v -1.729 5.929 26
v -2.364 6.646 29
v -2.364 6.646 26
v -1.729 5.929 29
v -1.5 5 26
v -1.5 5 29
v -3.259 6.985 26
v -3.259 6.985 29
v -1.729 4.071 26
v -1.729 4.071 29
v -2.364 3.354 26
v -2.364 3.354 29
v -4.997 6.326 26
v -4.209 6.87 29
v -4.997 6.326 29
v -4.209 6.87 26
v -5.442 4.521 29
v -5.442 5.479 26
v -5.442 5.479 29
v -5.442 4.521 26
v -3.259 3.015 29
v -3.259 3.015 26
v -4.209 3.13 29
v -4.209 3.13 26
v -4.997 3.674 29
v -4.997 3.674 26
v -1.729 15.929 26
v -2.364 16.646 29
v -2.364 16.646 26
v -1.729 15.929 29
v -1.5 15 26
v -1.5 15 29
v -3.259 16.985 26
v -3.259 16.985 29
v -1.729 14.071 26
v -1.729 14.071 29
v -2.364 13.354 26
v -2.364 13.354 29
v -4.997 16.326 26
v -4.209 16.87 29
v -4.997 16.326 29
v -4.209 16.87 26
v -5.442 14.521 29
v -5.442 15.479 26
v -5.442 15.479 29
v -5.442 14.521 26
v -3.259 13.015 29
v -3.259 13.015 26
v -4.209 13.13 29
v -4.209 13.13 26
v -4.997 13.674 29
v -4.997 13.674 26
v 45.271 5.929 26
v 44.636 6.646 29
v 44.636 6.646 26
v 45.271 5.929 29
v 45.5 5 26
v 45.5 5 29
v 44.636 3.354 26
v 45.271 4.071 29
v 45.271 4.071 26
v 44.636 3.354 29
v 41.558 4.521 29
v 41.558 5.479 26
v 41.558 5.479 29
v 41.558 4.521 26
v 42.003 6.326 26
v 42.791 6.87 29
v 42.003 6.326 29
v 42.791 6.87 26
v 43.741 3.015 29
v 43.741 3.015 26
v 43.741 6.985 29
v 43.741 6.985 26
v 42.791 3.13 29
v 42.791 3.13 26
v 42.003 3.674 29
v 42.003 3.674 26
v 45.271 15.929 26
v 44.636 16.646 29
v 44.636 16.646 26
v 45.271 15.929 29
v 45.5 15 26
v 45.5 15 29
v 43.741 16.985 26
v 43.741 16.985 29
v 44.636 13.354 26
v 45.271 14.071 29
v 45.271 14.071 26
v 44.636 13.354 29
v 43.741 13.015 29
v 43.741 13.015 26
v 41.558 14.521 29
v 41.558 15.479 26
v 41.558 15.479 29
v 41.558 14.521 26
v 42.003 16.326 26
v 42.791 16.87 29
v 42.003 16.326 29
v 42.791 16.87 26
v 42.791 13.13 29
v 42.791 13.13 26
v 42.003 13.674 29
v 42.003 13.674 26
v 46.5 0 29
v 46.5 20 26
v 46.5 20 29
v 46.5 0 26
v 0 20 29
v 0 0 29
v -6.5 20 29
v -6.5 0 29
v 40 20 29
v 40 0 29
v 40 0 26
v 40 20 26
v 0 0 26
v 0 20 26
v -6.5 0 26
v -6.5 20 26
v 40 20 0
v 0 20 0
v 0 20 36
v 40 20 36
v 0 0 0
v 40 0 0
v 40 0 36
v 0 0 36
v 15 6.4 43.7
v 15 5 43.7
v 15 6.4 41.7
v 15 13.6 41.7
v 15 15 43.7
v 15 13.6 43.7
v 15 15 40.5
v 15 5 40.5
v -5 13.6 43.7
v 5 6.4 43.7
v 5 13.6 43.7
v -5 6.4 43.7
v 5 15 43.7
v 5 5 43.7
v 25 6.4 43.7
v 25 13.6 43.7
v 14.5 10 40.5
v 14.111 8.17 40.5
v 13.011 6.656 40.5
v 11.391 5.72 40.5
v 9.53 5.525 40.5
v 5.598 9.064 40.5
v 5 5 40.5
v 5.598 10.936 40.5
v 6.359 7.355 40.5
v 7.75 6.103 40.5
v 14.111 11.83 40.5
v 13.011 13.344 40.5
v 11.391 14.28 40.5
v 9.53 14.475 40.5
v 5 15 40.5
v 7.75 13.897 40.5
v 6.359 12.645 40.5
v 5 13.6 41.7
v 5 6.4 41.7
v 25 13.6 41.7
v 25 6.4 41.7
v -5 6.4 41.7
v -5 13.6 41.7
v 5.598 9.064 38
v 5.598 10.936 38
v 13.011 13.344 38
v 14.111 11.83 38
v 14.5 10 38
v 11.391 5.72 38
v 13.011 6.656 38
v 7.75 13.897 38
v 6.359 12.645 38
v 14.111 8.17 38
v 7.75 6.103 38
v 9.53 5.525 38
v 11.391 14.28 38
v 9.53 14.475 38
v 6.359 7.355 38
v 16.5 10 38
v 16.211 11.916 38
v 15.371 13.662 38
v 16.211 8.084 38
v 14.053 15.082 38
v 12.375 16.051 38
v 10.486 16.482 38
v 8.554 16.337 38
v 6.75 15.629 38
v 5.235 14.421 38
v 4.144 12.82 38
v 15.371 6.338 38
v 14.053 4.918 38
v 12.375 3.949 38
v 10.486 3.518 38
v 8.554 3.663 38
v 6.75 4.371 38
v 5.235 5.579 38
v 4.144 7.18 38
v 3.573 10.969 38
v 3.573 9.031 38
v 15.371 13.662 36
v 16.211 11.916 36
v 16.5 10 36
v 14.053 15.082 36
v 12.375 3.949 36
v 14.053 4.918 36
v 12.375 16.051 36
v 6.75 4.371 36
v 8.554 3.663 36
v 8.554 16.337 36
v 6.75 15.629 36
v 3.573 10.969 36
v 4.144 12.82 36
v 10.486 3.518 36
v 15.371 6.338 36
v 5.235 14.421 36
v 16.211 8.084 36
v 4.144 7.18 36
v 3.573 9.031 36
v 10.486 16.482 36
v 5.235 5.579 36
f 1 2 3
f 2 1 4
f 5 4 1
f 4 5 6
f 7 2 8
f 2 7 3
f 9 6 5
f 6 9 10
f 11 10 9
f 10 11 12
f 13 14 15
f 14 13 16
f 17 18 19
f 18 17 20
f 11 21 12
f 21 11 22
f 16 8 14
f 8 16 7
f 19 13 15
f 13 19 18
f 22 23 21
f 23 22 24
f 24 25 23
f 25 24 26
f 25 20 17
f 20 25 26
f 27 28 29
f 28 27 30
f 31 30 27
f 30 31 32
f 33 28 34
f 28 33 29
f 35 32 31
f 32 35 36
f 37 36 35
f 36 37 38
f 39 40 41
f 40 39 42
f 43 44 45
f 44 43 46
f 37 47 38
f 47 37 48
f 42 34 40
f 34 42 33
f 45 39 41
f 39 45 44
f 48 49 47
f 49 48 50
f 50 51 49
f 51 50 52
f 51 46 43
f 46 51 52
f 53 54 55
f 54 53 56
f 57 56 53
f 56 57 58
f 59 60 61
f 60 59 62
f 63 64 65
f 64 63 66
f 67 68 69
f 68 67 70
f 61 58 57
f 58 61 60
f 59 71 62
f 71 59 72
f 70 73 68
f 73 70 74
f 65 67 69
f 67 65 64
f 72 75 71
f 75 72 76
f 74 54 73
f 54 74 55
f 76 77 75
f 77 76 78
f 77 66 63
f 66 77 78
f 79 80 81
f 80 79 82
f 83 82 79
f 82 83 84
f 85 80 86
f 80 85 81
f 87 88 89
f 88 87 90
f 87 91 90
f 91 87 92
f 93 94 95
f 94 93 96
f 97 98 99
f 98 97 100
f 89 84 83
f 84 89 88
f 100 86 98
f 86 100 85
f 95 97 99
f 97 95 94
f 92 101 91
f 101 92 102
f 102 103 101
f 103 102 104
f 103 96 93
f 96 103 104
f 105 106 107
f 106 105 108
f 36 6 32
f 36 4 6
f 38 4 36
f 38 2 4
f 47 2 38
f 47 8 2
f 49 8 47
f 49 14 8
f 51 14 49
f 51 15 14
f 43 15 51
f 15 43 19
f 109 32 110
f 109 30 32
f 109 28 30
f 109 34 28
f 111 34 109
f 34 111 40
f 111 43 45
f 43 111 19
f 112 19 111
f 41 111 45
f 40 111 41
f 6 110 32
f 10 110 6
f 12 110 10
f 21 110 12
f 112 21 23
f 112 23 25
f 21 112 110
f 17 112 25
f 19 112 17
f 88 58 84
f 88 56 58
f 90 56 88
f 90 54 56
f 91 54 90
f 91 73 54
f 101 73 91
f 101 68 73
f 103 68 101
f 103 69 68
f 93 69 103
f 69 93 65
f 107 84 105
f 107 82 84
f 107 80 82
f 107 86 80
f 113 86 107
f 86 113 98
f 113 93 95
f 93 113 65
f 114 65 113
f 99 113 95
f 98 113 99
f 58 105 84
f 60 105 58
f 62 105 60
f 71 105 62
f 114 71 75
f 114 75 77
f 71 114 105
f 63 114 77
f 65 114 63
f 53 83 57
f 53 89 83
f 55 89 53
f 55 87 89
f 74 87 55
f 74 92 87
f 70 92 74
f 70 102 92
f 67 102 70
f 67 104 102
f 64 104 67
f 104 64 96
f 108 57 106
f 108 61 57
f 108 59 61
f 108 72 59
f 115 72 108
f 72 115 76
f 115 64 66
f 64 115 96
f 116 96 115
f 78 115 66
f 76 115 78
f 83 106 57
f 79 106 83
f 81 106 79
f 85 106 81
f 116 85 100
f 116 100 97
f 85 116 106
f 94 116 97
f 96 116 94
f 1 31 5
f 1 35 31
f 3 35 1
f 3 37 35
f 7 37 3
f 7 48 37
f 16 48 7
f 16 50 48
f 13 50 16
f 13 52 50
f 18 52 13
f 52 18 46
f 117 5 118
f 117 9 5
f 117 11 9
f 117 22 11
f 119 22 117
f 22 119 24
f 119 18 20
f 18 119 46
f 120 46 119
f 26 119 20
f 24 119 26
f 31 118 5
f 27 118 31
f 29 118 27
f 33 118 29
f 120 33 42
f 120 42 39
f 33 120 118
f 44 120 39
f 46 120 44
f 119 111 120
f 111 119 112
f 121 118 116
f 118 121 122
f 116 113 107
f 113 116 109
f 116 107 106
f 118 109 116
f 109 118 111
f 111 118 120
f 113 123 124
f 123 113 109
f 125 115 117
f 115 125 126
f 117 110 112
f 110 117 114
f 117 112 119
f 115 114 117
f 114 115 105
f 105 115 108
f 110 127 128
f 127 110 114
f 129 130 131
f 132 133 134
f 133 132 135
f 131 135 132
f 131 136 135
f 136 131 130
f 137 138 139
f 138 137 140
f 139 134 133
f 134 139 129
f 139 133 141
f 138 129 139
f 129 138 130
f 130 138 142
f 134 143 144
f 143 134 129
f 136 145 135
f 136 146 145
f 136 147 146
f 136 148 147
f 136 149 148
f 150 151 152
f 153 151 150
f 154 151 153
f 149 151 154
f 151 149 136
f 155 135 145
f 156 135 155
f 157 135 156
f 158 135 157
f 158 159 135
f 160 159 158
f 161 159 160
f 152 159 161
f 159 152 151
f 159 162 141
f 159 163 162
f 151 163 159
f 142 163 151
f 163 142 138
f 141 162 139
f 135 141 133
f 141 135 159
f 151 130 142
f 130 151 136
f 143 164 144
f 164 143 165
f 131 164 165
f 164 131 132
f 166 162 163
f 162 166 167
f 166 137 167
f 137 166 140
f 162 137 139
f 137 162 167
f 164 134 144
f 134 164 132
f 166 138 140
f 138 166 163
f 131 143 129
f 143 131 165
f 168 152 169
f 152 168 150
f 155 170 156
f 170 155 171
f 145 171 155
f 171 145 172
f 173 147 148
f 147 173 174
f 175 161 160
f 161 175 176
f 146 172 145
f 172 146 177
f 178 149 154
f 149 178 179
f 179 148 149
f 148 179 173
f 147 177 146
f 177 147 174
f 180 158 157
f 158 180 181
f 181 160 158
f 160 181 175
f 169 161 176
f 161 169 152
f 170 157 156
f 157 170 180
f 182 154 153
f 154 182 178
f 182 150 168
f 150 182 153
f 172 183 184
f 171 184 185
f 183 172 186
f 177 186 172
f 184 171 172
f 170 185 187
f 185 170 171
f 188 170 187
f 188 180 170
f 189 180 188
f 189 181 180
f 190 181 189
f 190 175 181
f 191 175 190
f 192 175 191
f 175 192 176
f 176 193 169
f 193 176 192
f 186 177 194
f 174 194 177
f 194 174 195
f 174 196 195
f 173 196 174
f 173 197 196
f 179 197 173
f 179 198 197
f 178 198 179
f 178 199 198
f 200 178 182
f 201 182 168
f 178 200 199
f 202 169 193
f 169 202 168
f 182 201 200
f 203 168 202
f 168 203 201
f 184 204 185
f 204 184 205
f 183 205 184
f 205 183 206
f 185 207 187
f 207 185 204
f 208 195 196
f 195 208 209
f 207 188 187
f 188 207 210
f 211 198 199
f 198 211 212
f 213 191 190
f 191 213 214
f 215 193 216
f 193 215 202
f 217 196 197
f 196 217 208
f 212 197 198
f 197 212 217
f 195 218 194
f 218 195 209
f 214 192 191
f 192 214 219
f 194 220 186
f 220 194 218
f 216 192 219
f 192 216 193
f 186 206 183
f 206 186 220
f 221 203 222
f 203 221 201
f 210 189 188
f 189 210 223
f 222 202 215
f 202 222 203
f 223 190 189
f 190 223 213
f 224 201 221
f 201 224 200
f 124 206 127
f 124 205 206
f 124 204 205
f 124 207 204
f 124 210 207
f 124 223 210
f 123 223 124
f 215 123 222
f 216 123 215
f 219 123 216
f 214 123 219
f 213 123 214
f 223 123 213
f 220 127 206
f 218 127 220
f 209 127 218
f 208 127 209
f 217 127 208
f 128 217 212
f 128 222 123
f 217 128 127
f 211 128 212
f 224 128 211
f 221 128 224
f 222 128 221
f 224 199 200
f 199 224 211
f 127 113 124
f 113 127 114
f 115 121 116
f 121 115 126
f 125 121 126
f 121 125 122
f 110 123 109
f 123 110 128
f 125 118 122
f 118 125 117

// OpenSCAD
// file: servoMountLock.scad
module servoMountLock()
{
  space=[0.5, 0.5, 0.5];
  difference()
  {
    translate([-14-5, -10-10, 0])
      cube([2*(14+5), 2*(10+10), 4.5]);
    // screw holes
    for(dx = [-1, +1])
      for(dy = [-1, +1])
        translate([dx*14, dy*10, -2])
          cylinder(r=(3+1)/2, $fs=1.5, h=4.5+4);
    translate([0, 0, 1])
    {
      // main rod mounting hole
      translate([-(7.5+space[0])/2, -(30+space[1])/2, 4.5-(2+space[2])])
        cube([7.5, 30, 2] + space);
      // center, thicker part
      translate([-(10+space[0])/2, -(10+space[1])/2, 4.5-(3.5+space[2])])
        cube([10, 10, 3.5] + space);
    }
    // servo's screw space
    translate([0, 0, -1])
      cylinder(r=(9+1)/2, h=6, $fs=1);
  }
}

for(i=[0:1])
  translate([0, i*45, 0])
    servoMountLock();
// main file
use <servoMountLock.scad>

module servo()
{
  cube([40, 20, 36]);
  // mount shelf
  difference()
  {
    translate([-13/2, 0, 26])
      cube([53, 20, 3]);
    // holes
    #for(dx=[-1, +1])
      for(dy=[-1, +1])
        translate([53/2-13/2+dx*47/2, 20/2+dy*(6-1), 26-4])
          cylinder(r=4/2, $fs=1, h=10);
  }
  // rotor bottom
  translate([13/2+3.5, 20/2, 36])
  {
    cylinder(r=13/2, h=2);
    // rotor itself
    translate([0,0,2])
    {
      cylinder(r=9/2, h=2.5);
      // center part
      translate([-10/2, -10/2, 2.5])
      {
        cube([10, 10, 3.2]);
        // side bars
        translate([-10, (10-7.2)/2, 1.2])
          cube([30, 7.2, 2]);
      }
    }
  }
}

servo();

%translate([13/2+3.5, 20/2, 36+3.2])
  rotate([0, 0, 90])
    servoMountLock();
